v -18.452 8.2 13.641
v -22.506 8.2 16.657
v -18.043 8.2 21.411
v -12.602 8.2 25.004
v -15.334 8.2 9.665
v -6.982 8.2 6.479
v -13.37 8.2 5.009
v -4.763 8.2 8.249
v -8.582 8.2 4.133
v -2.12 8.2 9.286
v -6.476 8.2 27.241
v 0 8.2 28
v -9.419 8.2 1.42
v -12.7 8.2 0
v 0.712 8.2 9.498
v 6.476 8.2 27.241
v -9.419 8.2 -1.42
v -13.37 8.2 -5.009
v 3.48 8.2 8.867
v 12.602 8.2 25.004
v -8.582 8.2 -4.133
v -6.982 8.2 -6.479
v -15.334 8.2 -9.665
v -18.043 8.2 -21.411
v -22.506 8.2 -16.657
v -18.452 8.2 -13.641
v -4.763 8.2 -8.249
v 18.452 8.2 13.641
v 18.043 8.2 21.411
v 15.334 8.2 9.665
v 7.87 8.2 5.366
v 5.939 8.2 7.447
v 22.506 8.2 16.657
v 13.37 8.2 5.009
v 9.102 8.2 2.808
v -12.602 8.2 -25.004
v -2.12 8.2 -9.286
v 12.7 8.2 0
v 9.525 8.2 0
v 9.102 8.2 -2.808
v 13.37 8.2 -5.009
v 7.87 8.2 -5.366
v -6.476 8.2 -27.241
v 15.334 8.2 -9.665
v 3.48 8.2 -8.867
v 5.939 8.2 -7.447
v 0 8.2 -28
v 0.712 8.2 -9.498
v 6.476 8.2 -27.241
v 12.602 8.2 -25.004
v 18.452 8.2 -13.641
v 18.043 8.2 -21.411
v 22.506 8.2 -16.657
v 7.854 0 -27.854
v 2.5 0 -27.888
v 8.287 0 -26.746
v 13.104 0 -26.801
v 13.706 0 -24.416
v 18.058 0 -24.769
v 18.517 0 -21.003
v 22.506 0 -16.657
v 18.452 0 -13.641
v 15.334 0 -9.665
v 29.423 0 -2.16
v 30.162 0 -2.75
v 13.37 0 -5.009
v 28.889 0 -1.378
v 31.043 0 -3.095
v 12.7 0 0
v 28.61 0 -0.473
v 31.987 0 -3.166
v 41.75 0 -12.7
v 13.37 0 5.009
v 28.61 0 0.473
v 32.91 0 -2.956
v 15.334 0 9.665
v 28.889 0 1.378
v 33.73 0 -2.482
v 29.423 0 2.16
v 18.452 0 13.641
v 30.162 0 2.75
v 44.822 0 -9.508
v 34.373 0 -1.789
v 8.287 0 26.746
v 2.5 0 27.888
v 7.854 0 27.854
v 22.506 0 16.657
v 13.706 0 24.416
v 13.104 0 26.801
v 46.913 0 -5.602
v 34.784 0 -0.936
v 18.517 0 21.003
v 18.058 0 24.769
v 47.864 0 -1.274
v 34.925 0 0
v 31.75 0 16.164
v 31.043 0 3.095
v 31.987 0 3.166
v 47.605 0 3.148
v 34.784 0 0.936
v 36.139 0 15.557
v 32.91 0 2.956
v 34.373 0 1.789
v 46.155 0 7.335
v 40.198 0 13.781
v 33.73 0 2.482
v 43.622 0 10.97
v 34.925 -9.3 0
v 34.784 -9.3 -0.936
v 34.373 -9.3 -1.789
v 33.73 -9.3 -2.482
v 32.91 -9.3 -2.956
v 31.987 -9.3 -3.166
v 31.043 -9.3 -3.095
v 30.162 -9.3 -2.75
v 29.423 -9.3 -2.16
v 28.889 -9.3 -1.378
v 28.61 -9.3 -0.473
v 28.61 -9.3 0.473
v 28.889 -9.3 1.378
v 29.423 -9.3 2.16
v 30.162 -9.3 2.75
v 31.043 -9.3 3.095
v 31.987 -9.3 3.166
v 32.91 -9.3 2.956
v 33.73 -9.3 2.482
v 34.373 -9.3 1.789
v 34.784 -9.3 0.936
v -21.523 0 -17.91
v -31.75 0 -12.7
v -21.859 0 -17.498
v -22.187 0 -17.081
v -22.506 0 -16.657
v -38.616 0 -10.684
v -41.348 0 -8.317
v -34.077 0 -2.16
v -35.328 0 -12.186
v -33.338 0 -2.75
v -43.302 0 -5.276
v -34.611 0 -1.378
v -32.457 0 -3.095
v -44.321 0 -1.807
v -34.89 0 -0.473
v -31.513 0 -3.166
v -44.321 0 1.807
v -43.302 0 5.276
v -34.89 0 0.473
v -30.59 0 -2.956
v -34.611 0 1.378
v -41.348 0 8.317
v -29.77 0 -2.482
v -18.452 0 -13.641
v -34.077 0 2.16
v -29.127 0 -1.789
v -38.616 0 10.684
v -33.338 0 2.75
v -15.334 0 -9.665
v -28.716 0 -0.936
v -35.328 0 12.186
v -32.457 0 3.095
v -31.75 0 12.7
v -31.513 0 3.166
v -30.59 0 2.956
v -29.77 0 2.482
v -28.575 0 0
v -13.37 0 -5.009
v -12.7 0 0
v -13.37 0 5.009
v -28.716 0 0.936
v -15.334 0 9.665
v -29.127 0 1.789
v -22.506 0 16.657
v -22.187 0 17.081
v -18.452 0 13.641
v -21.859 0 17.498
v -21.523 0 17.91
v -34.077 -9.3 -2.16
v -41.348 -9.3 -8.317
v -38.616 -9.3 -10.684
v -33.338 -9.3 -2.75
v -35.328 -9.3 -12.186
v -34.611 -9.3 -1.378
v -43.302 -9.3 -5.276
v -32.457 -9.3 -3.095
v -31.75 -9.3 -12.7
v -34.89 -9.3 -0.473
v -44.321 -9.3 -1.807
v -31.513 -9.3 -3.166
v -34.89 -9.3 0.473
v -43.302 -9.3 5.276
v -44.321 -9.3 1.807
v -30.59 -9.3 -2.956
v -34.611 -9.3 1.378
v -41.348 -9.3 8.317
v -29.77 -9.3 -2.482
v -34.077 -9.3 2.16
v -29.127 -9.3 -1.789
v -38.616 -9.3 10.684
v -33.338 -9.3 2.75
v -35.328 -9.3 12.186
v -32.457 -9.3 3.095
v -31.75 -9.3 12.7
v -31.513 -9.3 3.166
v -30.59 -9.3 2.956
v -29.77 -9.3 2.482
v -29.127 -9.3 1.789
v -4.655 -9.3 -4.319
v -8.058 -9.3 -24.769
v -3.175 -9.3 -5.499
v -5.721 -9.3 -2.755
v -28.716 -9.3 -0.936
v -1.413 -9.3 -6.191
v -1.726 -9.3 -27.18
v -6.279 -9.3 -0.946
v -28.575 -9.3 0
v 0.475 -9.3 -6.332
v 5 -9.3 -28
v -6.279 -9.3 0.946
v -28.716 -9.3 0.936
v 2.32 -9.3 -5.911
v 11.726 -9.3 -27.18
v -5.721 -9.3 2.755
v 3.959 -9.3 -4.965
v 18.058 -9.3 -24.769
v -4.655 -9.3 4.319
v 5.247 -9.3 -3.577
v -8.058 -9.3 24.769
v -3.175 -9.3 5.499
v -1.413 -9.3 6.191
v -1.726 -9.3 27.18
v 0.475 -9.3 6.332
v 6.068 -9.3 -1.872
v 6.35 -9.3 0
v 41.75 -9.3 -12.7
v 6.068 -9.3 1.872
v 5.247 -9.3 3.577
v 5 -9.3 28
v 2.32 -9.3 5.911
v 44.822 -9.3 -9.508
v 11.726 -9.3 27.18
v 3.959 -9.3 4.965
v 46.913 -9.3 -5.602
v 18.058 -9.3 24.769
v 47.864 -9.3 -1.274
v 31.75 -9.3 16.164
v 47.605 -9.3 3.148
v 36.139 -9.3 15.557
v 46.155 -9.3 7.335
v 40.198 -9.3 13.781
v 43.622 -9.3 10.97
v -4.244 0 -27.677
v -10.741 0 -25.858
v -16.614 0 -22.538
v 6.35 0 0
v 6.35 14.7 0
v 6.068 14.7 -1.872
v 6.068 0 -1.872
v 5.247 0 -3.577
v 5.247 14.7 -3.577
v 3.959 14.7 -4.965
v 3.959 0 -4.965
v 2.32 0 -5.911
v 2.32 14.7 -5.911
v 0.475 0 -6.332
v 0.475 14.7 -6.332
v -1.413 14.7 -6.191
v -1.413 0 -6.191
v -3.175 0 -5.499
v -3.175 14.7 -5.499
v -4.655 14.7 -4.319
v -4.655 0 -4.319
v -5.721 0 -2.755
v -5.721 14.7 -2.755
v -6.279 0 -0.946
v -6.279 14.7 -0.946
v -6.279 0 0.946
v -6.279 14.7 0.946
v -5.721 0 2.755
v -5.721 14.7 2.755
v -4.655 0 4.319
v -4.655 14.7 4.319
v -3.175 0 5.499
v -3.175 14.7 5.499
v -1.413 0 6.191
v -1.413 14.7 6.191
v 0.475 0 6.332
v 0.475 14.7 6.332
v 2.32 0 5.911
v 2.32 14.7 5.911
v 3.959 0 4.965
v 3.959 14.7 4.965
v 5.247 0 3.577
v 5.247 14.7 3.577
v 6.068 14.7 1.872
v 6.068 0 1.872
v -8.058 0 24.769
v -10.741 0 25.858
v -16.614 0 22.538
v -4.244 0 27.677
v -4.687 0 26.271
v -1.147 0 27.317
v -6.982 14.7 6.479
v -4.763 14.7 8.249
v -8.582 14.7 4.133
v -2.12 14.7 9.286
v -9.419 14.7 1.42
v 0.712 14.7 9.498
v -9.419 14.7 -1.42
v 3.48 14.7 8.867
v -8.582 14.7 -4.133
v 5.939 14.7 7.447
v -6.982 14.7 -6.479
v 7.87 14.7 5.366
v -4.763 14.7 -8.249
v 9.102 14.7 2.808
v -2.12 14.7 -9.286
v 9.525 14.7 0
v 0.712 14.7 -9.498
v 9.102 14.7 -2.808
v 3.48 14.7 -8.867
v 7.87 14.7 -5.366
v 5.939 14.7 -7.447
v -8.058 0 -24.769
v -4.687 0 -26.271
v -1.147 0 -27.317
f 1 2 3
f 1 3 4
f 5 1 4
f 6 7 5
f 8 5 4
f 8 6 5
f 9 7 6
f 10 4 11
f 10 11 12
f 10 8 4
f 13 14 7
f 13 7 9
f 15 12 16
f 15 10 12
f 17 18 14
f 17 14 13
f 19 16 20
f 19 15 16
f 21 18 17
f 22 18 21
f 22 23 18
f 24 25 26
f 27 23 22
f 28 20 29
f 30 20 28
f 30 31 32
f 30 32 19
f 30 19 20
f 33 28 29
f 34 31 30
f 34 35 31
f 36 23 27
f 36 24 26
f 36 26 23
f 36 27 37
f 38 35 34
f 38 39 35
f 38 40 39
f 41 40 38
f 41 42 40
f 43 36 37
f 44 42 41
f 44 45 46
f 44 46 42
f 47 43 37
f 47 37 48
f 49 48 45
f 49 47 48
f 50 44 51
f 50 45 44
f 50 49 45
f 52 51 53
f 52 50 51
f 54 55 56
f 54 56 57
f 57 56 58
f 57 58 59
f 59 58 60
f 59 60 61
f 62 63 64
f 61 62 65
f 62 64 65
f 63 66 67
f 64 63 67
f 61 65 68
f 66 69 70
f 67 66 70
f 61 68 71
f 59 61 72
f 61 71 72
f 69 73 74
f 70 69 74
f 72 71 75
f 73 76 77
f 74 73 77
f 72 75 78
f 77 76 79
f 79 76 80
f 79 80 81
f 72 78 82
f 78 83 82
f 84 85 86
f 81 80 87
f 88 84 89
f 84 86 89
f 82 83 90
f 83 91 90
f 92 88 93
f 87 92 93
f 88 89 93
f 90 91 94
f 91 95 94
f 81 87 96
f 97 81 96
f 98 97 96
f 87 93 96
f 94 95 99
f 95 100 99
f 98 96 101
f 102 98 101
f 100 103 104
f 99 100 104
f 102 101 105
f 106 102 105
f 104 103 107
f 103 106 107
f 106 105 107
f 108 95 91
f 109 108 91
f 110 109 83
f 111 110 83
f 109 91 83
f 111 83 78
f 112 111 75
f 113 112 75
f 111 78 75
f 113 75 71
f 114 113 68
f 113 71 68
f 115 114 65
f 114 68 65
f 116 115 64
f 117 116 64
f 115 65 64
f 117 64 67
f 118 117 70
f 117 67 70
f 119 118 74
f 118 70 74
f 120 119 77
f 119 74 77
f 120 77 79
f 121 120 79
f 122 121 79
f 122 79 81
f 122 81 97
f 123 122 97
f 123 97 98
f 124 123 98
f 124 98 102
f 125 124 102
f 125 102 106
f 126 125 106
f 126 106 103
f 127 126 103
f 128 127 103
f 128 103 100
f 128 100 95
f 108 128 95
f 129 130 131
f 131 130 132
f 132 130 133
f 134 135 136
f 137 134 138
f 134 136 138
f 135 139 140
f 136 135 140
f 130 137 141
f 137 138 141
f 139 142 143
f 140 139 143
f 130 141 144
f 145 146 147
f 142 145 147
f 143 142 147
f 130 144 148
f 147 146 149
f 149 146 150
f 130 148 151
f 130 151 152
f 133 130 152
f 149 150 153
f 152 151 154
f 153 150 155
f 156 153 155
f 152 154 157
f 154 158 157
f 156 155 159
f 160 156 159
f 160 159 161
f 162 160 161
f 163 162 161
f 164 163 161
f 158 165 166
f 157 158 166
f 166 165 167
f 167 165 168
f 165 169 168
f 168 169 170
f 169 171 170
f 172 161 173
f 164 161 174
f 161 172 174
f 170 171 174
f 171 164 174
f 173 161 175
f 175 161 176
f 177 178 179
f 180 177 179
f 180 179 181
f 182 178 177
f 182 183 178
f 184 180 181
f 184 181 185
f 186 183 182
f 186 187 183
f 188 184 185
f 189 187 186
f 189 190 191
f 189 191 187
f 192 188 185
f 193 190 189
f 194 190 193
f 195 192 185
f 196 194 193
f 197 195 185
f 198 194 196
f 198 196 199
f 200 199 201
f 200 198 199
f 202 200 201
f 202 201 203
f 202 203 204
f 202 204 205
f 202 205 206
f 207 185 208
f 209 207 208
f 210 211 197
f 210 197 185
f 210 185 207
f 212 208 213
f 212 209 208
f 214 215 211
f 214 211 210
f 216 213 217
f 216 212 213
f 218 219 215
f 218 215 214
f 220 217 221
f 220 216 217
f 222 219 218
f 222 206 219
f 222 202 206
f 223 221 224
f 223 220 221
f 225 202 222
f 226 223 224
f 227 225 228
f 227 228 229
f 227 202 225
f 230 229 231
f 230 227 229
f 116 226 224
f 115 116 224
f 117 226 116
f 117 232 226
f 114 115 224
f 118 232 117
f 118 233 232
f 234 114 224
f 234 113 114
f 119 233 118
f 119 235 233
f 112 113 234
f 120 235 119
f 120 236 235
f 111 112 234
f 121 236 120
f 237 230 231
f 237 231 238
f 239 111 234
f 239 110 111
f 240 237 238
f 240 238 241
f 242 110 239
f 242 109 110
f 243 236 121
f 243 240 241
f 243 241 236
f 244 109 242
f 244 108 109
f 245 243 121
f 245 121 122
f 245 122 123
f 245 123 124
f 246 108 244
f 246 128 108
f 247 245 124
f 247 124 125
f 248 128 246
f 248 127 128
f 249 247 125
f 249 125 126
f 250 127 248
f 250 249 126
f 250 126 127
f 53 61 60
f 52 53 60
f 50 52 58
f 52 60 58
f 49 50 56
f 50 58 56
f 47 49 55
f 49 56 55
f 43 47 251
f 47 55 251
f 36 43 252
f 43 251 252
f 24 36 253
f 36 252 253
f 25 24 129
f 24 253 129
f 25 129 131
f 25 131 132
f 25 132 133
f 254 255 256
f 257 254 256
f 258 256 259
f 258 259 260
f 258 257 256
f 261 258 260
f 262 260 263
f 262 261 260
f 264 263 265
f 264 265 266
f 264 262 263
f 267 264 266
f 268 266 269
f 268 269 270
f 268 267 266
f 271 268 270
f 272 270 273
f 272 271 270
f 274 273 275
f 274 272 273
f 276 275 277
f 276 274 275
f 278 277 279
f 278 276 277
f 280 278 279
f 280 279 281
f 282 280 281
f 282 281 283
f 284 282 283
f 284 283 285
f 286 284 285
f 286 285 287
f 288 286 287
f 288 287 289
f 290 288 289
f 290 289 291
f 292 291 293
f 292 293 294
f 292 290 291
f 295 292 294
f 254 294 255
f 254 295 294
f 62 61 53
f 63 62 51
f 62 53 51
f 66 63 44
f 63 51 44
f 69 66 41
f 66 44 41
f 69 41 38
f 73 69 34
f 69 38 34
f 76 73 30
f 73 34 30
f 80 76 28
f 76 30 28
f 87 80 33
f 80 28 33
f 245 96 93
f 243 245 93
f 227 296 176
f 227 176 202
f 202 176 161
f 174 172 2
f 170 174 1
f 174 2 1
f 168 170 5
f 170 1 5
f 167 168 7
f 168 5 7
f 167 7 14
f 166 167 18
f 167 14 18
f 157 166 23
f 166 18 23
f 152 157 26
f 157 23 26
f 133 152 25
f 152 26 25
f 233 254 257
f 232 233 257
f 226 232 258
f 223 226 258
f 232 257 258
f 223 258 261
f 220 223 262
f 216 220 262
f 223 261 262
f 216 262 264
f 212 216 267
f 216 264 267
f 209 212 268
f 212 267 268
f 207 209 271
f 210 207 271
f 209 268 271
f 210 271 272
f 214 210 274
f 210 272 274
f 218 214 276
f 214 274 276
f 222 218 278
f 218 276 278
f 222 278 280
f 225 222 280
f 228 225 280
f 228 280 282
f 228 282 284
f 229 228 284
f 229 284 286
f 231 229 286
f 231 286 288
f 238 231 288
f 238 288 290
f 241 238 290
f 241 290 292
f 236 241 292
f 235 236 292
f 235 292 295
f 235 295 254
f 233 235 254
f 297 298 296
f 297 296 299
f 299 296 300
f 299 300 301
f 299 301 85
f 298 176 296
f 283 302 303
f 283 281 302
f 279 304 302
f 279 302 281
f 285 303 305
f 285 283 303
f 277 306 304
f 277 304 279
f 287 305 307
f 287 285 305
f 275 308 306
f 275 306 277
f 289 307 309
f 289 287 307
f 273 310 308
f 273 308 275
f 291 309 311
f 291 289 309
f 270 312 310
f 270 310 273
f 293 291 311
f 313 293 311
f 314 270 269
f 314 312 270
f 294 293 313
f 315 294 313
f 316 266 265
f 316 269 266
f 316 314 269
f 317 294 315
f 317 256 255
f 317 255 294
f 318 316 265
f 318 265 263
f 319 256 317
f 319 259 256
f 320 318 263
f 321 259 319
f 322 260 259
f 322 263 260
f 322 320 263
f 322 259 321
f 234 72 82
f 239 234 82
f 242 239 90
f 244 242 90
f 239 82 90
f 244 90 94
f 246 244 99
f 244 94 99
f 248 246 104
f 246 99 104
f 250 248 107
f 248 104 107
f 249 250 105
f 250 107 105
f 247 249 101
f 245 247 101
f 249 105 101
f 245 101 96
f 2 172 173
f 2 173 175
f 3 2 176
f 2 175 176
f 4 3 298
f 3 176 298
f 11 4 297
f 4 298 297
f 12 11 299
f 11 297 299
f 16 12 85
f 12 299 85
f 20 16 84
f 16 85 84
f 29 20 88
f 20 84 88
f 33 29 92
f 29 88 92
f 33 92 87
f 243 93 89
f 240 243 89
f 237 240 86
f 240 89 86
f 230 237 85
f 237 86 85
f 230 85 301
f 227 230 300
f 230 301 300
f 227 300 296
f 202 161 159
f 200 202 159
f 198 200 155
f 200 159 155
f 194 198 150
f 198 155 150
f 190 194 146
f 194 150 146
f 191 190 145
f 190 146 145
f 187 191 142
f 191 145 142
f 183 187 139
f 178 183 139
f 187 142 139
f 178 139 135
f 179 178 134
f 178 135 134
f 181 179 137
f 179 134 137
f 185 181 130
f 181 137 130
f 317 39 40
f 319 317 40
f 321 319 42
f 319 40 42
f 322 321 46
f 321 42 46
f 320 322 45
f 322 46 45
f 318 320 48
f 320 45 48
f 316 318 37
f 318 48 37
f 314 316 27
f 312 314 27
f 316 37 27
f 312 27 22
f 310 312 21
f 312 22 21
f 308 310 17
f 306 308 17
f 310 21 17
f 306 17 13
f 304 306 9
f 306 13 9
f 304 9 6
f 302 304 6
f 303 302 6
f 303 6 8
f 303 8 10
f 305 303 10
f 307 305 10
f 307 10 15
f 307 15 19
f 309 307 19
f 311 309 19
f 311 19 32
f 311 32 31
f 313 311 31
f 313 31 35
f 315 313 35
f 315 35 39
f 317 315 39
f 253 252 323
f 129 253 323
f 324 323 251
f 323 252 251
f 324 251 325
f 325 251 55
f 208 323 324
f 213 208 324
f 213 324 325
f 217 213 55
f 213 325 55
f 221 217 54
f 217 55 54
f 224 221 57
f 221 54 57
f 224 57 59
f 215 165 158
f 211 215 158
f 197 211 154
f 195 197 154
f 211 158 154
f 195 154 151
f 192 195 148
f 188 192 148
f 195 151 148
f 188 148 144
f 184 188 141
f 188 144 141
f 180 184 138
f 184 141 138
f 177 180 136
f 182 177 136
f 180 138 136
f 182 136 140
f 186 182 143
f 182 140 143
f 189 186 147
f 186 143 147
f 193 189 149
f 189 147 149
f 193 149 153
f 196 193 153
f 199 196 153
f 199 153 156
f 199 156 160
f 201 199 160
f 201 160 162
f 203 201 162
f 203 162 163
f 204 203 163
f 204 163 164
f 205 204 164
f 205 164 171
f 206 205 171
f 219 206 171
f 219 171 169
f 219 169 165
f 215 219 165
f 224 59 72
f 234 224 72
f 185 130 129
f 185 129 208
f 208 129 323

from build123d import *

# Parameters (mm, degrees)
SKETCH2_R           = 9.525
SKETCH2_R_2         = 6.35
BOSS_EXTRUDE1_DEPTH = 14.699996
BOSS_EXTRUDE2_DEPTH = 9.3000068
SKETCH4_R           = 6.35
CUT_EXTRUDE1_DEPTH  = 2540
SKETCH5_R           = 3.175
CUT_EXTRUDE2_DEPTH  = 2540
SKETCH6_R           = 28
SKETCH6_R_2         = 7.320365212
BOSS_EXTRUDE3_DEPTH = 8.200009
SKETCH8_R           = 19.05
CUT_EXTRUDE3_DEPTH  = 8.200009


with BuildPart() as part:
    # Sketch2 → Boss-Extrude1 (new body)
    with BuildSketch(Plane(origin=(0, 0, 0), x_dir=(1, 0, 0), z_dir=(0, 1, 0))):
        Circle(SKETCH2_R)
        Circle(SKETCH2_R_2, mode=Mode.SUBTRACT)
    extrude(amount=BOSS_EXTRUDE1_DEPTH)

    # Sketch3 → Boss-Extrude2 (add)
    with BuildSketch(Plane.XZ):
        with BuildLine():
            Line((-31.75, -12.7), (-8.058170349, -24.768612943))
            ThreePointArc((-8.058170349, -24.768612943), (5, -28), (18.058170349, -24.768612943))
            Line((18.058170349, -24.768612943), (41.75, -12.7))
            ThreePointArc((41.75, -12.7), (47.023813104, 5.291562459), (31.75, 16.164467204))
            Line((31.75, 16.164467204), (18.058170349, 24.768612943))
            ThreePointArc((18.058170349, 24.768612943), (5, 28), (-8.058170349, 24.768612943))
            Line((-8.058170349, 24.768612943), (-31.75, 12.7))
            ThreePointArc((-31.75, 12.7), (-44.45, 0), (-31.75, -12.7))
        make_face()
    extrude(amount=BOSS_EXTRUDE2_DEPTH)

    # Sketch4 → Cut-Extrude1 (cut)
    with BuildSketch(Plane(origin=(0, 0, 0), x_dir=(1, 0, 0), z_dir=(0, 1, 0))):
        Circle(SKETCH4_R)
    extrude(amount=-CUT_EXTRUDE1_DEPTH, mode=Mode.SUBTRACT)

    # Sketch5 → Cut-Extrude2 (cut)
    with BuildSketch(Plane(origin=(0, 0, 0), x_dir=(1, 0, 0), z_dir=(0, 1, 0))):
        with Locations((-31.75, 0)):
            Circle(SKETCH5_R)
        with Locations((31.75, 0)):
            Circle(SKETCH5_R)
    extrude(amount=-CUT_EXTRUDE2_DEPTH, mode=Mode.SUBTRACT)

    # Sketch6 → Boss-Extrude3 (add)
    with BuildSketch(Plane(origin=(0, 0, 0), x_dir=(1, 0, 0), z_dir=(0, 1, 0))):
        Circle(SKETCH6_R)
        Circle(SKETCH6_R_2, mode=Mode.SUBTRACT)
    extrude(amount=BOSS_EXTRUDE3_DEPTH)

    # Sketch8 → Cut-Extrude3 (cut)
    with BuildSketch(Plane(origin=(0, 8.200009, 0), x_dir=(1, 0, 0), z_dir=(0, 1, 0))):
        with Locations((-31.75, 0)):
            Circle(SKETCH8_R)
        with Locations((31.75, 0)):
            Circle(SKETCH8_R)
    extrude(amount=-CUT_EXTRUDE3_DEPTH, mode=Mode.SUBTRACT)


solid = part.part
